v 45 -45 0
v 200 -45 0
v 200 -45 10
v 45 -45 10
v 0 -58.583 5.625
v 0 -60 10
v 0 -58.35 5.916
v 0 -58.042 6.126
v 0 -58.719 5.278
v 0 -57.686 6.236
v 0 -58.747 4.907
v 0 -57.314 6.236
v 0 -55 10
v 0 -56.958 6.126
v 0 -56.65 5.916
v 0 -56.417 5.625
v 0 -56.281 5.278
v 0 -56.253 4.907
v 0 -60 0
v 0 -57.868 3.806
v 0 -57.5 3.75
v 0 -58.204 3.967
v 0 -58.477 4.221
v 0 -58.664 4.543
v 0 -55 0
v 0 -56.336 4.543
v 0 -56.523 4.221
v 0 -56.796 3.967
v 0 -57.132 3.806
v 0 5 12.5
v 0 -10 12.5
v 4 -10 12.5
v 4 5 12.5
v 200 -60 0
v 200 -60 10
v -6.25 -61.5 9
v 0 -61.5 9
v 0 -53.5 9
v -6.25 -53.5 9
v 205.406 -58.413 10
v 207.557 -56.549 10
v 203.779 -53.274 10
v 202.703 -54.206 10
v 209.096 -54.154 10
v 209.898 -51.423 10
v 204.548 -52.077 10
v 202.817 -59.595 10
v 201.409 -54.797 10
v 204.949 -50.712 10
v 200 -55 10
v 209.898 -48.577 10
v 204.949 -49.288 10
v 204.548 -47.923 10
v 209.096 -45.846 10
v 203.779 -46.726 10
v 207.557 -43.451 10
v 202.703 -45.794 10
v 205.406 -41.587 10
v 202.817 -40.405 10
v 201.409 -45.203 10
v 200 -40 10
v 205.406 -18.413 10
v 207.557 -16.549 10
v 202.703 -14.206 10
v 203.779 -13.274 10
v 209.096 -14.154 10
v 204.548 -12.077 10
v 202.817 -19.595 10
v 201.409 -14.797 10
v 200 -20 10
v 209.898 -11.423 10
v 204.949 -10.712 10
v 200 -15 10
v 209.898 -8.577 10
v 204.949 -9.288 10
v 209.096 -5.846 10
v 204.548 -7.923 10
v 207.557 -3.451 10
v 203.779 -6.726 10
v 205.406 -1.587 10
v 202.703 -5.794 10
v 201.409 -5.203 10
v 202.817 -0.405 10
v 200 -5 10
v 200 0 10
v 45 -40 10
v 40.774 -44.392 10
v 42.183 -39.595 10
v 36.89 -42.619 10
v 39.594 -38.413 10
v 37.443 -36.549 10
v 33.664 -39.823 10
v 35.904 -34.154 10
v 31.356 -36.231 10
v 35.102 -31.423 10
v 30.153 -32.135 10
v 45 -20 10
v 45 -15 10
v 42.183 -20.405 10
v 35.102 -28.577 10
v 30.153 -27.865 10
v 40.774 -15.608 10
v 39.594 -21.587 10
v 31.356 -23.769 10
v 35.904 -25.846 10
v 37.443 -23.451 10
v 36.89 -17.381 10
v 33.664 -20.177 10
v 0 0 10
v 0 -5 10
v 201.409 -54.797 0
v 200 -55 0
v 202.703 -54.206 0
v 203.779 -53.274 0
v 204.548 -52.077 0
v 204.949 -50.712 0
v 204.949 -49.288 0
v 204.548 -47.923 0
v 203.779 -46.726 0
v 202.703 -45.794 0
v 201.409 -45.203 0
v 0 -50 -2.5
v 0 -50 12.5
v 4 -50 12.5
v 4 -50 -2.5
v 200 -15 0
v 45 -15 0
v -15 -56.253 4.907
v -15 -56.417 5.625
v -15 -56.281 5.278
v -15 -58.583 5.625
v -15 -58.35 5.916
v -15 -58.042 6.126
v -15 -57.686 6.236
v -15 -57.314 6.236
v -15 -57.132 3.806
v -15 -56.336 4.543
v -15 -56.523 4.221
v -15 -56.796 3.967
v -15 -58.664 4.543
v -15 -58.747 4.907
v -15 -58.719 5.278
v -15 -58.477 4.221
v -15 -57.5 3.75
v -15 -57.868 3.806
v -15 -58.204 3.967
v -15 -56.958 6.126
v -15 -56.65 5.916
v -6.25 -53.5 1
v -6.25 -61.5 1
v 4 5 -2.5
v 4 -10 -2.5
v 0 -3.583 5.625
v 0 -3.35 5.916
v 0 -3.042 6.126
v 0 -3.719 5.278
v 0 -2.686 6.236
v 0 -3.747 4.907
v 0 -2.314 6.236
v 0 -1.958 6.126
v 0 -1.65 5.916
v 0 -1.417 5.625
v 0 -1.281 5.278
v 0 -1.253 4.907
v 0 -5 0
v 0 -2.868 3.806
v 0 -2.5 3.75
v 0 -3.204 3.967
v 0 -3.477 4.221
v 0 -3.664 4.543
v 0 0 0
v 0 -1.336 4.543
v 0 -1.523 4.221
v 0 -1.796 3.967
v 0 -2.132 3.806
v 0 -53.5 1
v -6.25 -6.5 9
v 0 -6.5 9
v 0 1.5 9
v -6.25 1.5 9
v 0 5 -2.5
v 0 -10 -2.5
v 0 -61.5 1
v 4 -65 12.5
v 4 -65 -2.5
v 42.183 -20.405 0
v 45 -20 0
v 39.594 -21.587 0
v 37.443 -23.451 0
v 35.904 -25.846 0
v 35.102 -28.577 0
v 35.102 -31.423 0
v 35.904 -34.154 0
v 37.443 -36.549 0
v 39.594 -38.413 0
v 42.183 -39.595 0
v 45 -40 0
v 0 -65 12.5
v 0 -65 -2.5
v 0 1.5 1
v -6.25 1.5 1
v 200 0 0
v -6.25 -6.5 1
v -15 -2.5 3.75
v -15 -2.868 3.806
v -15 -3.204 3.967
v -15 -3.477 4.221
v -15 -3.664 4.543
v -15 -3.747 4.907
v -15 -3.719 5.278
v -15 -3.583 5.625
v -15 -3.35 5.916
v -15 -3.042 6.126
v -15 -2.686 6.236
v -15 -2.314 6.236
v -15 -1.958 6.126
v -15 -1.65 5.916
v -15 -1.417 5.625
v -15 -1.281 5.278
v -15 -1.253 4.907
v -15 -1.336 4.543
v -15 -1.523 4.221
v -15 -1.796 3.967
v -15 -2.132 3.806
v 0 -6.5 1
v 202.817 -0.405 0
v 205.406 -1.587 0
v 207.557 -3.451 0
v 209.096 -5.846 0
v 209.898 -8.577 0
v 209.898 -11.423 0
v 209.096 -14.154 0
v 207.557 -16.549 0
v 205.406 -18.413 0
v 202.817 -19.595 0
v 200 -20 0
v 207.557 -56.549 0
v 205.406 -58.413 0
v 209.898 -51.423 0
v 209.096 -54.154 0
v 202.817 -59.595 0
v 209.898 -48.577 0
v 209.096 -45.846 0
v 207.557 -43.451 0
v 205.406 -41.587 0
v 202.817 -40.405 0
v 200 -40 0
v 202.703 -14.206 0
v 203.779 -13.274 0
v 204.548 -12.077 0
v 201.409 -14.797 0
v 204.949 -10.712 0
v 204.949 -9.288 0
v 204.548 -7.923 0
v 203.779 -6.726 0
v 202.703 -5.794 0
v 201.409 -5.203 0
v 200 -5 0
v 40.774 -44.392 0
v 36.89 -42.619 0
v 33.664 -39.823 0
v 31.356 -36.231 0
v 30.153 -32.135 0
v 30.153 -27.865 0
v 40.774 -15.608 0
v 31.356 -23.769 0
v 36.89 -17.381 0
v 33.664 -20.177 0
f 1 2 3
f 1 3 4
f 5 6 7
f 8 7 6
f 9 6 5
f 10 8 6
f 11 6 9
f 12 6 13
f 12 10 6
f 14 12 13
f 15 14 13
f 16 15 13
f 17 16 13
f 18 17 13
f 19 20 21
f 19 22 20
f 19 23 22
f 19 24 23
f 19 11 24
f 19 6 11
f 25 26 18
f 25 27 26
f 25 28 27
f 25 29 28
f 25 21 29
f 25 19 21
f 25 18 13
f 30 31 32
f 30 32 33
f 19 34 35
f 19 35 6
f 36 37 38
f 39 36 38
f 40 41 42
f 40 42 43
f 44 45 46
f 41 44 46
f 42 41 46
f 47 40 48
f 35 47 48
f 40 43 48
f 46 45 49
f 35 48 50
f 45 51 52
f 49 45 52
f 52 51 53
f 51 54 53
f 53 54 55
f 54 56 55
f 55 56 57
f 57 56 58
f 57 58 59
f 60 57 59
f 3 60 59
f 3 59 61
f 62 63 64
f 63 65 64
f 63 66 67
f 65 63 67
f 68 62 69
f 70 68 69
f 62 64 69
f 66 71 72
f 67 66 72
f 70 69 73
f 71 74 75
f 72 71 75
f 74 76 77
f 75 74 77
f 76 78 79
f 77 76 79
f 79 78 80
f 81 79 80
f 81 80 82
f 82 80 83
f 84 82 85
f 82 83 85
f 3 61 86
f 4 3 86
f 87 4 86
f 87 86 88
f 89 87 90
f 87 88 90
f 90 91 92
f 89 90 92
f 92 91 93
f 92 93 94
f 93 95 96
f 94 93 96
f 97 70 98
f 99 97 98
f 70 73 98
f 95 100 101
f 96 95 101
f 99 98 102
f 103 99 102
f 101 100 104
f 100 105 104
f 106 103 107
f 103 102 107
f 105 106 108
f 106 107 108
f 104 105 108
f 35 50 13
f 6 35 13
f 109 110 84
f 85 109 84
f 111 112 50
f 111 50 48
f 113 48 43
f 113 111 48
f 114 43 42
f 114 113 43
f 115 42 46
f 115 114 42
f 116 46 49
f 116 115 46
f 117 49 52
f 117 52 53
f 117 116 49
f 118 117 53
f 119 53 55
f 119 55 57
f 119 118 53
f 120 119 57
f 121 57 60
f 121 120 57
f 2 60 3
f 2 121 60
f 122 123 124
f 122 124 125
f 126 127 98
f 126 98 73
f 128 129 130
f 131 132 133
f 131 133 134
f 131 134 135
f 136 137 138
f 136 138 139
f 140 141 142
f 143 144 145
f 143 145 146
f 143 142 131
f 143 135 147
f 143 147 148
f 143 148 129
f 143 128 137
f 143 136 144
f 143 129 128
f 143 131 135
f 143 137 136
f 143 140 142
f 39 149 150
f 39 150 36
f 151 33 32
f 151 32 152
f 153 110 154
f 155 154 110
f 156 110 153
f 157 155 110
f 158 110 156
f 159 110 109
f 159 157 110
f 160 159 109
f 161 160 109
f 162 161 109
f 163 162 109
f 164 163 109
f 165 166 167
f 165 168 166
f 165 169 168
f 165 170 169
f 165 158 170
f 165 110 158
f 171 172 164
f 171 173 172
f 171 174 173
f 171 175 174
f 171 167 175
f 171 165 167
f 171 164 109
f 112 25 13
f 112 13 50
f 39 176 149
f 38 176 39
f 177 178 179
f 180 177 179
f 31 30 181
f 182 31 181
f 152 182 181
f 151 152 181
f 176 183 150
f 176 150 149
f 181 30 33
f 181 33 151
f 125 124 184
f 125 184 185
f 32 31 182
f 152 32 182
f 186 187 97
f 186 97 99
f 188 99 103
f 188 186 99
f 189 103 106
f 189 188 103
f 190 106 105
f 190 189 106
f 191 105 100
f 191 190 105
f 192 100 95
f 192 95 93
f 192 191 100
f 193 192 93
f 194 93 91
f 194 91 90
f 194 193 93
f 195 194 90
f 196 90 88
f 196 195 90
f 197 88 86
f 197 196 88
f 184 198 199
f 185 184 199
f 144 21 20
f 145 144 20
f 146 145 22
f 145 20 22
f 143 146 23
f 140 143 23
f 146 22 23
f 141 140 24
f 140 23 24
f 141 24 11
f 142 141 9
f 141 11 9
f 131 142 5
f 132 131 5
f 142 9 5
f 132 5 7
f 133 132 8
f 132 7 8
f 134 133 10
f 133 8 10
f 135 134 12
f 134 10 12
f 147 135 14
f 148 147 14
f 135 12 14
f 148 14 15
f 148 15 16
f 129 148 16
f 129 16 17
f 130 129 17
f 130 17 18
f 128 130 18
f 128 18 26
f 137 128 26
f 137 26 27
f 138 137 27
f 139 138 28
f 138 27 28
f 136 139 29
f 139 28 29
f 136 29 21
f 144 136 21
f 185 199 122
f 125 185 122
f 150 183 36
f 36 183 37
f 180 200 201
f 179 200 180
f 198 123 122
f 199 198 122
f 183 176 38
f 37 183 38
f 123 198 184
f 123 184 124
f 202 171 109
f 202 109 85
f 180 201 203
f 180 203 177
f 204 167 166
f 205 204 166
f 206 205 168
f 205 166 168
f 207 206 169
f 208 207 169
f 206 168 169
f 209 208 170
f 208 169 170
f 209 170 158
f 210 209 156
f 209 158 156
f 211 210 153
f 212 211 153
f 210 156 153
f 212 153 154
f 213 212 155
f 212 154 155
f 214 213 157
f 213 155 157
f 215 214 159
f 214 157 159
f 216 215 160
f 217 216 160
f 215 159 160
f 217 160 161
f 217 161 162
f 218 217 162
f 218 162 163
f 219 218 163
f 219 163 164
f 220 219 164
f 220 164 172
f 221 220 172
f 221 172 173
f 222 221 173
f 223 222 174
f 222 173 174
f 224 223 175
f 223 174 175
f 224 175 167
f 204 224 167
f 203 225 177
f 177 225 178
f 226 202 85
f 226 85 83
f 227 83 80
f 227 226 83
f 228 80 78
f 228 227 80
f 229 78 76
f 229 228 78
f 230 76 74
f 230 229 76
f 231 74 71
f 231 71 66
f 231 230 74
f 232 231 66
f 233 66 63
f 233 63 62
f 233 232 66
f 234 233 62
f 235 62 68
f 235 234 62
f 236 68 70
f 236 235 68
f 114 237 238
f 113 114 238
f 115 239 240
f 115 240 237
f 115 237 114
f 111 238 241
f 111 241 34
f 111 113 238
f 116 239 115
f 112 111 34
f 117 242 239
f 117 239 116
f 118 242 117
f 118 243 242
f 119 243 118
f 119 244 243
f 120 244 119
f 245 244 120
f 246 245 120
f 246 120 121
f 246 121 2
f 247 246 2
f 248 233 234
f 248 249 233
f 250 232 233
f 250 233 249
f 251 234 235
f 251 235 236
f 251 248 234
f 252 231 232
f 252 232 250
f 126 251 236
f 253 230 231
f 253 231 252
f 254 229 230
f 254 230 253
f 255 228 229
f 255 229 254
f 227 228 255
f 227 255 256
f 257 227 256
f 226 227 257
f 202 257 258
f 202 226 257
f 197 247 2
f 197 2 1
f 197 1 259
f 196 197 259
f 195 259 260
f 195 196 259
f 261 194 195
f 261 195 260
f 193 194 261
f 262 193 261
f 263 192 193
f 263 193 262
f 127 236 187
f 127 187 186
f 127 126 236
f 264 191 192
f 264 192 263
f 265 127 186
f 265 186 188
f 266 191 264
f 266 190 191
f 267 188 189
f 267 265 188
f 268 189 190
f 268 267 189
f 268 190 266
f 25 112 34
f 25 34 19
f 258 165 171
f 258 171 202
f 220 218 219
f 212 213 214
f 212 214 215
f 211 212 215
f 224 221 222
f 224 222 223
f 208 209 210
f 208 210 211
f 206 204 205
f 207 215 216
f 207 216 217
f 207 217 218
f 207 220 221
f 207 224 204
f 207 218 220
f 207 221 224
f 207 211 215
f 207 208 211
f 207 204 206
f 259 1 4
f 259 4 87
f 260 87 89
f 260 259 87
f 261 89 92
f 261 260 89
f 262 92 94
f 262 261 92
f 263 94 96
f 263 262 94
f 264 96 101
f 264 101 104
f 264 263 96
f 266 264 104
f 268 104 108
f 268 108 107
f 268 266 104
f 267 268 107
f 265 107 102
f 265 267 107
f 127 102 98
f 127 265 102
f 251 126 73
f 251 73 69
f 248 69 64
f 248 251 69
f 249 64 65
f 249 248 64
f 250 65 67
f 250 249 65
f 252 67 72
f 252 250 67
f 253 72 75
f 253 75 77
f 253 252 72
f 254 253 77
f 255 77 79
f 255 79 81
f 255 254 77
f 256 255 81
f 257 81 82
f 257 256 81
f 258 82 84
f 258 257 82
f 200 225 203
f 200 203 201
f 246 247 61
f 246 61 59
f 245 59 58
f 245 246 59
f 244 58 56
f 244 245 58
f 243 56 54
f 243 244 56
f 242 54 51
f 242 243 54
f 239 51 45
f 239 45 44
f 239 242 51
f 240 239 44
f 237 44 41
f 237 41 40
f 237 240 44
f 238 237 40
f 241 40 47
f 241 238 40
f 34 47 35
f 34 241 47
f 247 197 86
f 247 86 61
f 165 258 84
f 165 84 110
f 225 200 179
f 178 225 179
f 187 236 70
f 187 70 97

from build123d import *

# Parameters (mm, degrees)
BOSS_EXTRUDE1_DEPTH   = 10
SKETCH2_R             = 1.25
BOSS_EXTRUDE2_DEPTH   = 15
SKETCH3_R             = 1.25
BOSS_EXTRUDE3_DEPTH   = 15
SKETCH4_W             = 15
SKETCH4_H             = 15
BOSS_EXTRUDE5_DEPTH   = 4
BOSS_EXTRUDE5_2_DEPTH = 4
SKETCH5_W             = 8
SKETCH5_H             = 8
BOSS_EXTRUDE6_DEPTH   = 6.25
BOSS_EXTRUDE6_2_DEPTH = 6.25


with BuildPart() as part:
    # Sketch1 → Boss-Extrude1 (new body)
    with BuildSketch(Plane.XY):
        with BuildLine():
            Line((0, 0), (200, 0))
            ThreePointArc((200, 0), (210, -10), (200, -20))
            Line((200, -20), (45, -20))
            ThreePointArc((45, -20), (35, -30), (45, -40))
            Line((45, -40), (200, -40))
            ThreePointArc((200, -40), (210, -50), (200, -60))
            Line((200, -60), (0, -60))
            Line((0, -60), (0, -55))
            Line((0, -55), (200, -55))
            ThreePointArc((200, -55), (205, -50), (200, -45))
            Line((200, -45), (45, -45))
            ThreePointArc((45, -45), (30, -30), (45, -15))
            Line((45, -15), (200, -15))
            ThreePointArc((200, -15), (205, -10), (200, -5))
            Line((200, -5), (0, -5))
            Line((0, -5), (0, 0))
        make_face()
    extrude(amount=BOSS_EXTRUDE1_DEPTH)

    # Sketch2 → Boss-Extrude2 (add)
    with BuildSketch(Plane.ZY):
        with Locations(Location((5, -2.5, 0), (0, 0, 180))):
            Circle(SKETCH2_R)
    extrude(amount=BOSS_EXTRUDE2_DEPTH)

    # Sketch3 → Boss-Extrude3 (add)
    with BuildSketch(Plane.ZY):
        with Locations(Location((5, -57.5, 0), (0, 0, 180))):
            Circle(SKETCH3_R)
    extrude(amount=BOSS_EXTRUDE3_DEPTH)


with BuildPart() as body_2:
    # Sketch4 → Boss-Extrude5 (new body)
    with BuildSketch(Plane(origin=(0, 0, 0), x_dir=(0, 0, -1), z_dir=(1, 0, 0))):
        with Locations((-5, -57.5)):
            Rectangle(SKETCH4_W, SKETCH4_H)
    extrude(amount=BOSS_EXTRUDE5_DEPTH)


with BuildPart() as body_3:
    # Sketch4 → Boss-Extrude5 2 (new body)
    with BuildSketch(Plane(origin=(0, 0, 0), x_dir=(0, 0, -1), z_dir=(1, 0, 0))):
        with Locations((-5, -2.5)):
            Rectangle(SKETCH4_W, SKETCH4_H)
    extrude(amount=BOSS_EXTRUDE5_2_DEPTH)


with BuildPart() as body_4:
    # Sketch5 → Boss-Extrude6 (new body)
    with BuildSketch(Plane.ZY):
        with Locations((5, -57.5)):
            Rectangle(SKETCH5_W, SKETCH5_H)
    extrude(amount=BOSS_EXTRUDE6_DEPTH)


with BuildPart() as body_5:
    # Sketch5 → Boss-Extrude6 2 (new body)
    with BuildSketch(Plane.ZY):
        with Locations((5, -2.5)):
            Rectangle(SKETCH5_W, SKETCH5_H)
    extrude(amount=BOSS_EXTRUDE6_2_DEPTH)


solid = Compound([part.part, body_2.part, body_3.part, body_4.part, body_5.part])
